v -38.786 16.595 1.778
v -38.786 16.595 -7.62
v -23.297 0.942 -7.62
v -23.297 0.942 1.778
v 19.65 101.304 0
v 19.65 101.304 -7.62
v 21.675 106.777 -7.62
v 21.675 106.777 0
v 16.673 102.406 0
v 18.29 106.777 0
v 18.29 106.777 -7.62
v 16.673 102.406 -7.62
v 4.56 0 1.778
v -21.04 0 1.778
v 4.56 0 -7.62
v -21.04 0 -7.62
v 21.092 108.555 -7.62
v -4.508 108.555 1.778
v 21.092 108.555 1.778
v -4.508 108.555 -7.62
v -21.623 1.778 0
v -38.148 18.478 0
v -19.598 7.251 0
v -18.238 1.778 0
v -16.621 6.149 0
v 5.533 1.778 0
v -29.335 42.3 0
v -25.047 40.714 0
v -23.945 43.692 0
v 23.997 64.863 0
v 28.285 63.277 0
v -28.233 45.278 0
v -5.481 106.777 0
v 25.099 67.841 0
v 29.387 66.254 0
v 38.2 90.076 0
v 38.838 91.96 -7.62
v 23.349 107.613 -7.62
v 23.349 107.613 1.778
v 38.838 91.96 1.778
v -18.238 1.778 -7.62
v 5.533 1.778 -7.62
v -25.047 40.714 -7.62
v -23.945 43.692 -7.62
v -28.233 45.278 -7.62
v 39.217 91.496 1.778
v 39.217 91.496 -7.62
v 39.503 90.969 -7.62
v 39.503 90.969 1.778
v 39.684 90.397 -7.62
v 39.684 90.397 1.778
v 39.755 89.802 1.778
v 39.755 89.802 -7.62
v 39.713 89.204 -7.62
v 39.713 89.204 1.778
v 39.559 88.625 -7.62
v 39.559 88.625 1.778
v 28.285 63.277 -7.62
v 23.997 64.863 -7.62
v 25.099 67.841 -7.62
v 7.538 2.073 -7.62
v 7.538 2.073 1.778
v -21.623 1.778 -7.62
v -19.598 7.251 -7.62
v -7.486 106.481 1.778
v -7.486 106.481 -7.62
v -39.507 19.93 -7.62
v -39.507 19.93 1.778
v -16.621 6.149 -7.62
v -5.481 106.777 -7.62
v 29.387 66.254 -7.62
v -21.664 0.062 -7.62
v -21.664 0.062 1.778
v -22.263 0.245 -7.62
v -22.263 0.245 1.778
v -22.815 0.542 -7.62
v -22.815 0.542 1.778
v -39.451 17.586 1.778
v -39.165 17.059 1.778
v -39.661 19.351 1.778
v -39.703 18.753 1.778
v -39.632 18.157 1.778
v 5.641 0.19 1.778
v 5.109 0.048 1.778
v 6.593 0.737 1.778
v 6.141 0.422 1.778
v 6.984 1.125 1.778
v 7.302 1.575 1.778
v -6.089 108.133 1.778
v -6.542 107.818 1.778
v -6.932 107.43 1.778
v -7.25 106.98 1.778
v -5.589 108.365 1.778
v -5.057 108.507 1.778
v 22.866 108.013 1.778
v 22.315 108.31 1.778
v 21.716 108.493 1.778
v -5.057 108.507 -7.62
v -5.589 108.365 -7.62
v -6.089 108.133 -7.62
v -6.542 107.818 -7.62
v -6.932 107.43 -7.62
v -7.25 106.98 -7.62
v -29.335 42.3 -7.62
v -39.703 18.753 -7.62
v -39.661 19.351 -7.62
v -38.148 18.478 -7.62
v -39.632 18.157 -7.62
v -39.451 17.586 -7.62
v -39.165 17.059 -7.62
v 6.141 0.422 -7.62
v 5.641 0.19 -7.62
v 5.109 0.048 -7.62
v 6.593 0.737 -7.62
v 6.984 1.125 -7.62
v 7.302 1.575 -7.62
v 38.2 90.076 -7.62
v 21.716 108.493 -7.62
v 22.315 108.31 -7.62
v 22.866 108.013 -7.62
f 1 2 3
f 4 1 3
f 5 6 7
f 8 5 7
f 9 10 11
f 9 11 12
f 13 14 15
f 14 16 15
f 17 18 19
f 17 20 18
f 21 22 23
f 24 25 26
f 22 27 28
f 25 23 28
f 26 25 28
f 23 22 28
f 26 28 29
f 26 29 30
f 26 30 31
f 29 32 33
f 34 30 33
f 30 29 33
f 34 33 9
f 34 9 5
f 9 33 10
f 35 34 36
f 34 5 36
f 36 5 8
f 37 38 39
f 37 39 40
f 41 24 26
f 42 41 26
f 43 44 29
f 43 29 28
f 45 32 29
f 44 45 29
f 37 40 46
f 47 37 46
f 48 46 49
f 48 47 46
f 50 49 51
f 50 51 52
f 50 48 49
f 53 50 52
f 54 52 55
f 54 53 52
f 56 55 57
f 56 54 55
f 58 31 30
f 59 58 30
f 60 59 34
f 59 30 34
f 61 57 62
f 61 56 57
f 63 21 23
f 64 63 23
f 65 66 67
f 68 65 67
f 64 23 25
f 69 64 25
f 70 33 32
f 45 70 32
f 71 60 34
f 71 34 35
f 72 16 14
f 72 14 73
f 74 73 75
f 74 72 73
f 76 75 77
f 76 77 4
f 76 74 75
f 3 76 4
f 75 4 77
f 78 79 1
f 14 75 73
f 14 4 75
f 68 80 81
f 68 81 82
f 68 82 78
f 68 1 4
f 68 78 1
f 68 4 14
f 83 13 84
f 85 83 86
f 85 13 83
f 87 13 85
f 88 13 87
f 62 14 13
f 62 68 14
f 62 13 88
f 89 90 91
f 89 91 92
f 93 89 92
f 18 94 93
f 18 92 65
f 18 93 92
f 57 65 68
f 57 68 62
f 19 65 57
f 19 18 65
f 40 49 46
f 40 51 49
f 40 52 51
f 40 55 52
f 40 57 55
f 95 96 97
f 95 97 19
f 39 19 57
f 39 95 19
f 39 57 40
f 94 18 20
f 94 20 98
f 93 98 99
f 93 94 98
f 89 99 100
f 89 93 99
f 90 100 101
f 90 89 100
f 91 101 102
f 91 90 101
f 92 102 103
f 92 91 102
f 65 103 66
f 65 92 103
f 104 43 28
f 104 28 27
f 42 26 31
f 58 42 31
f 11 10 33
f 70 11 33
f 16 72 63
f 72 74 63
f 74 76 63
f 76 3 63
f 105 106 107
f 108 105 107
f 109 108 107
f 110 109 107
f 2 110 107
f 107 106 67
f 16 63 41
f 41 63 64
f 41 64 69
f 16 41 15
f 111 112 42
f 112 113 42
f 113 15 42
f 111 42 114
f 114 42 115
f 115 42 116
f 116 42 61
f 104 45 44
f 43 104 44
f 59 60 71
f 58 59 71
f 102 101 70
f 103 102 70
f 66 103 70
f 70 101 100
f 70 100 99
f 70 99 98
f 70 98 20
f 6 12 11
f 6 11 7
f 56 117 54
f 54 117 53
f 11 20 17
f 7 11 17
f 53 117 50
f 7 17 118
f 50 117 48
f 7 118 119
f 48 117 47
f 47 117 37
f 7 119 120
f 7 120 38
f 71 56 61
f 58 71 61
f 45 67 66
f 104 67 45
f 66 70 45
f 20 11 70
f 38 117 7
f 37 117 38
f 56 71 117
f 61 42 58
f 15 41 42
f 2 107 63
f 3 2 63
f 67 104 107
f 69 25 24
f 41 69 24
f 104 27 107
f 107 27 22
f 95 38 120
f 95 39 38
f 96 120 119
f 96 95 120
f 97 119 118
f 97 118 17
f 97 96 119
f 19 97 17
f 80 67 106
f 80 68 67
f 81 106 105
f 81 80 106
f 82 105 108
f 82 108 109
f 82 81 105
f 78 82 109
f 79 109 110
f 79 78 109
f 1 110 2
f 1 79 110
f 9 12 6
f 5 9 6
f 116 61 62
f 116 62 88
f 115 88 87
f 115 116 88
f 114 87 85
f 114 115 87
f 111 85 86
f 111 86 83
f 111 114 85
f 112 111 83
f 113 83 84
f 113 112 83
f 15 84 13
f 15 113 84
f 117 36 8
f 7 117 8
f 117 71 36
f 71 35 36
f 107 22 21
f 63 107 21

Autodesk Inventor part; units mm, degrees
ref_plane "YZ Plane" through (0, 0, 0) normal (1, 0, 0) x (0, 1, 0)
ref_plane "XZ Plane" through (0, 0, 0) normal (0, 1, 0) x (-1, 0, 0)
ref_plane "XY Plane" through (0, 0, 0) normal (0, 0, 1) x (1, 0, 0)
sketch "TopProfile" plane through (0, 0, 0) normal (0, 0, 1) x (1, 0, 0)
  line L0 (22.417, 108.5547) -> (40.2604, 90.5219)
  line L1 (-6.7187, 108.5547) -> (22.417, 108.5547)
  line L2 (-6.7187, 108.5547) -> (-40.2084, 18.0328)
  line L3 (40.2604, 90.5219) -> (6.7706, 0)
  line L4 (-22.3651, 0) -> (6.7706, 0)
  line L5 (-40.2084, 18.0328) -> (-22.3651, 0)
  line L6 (-35.2804, 13.0524) -> (0.052, 108.5547) construction
  line L7 (0.052, 108.5547) -> (35.3323, 95.5023) construction
  line L8 (35.3323, 95.5023) -> (0, 0) construction
  line L9 (0, 0) -> (-35.2804, 13.0524) construction
  line L10 (-56.3022, 0) -> (56.3541, 0) construction
  line L11 (-38.1479, 18.4782) -> (-21.6231, 1.778)
  line L12 (-21.6231, 1.778) -> (5.5327, 1.778)
  line L13 (5.5327, 1.778) -> (38.1998, 90.0765)
  line L14 (38.1998, 90.0765) -> (21.6751, 106.7767)
  line L15 (21.6751, 106.7767) -> (-5.4807, 106.7767)
  line L16 (-5.4807, 106.7767) -> (-38.1479, 18.4782)
  line L17 (-29.3346, 42.3002) -> (-28.233, 45.278)
  line L18 (-28.233, 45.278) -> (-23.945, 43.6916)
  line L19 (-23.945, 43.6916) -> (-25.0467, 40.7138)
  line L20 (-25.0467, 40.7138) -> (-29.3346, 42.3002)
  line L21 (25.0986, 67.8409) -> (29.3866, 66.2545)
  line L22 (29.3866, 66.2545) -> (28.2849, 63.2768)
  line L23 (28.2849, 63.2768) -> (23.997, 64.8632)
  line L24 (23.997, 64.8632) -> (25.0986, 67.8409)
  line L25 (16.6726, 102.4057) -> (19.6504, 101.304)
  line L26 (19.6504, 101.304) -> (21.6751, 106.7767)
  line L27 (21.6751, 106.7767) -> (18.6973, 107.8784)
  line L28 (18.6973, 107.8784) -> (16.6726, 102.4057)
  line L29 (-19.5984, 7.2507) -> (-16.6207, 6.149)
  line L30 (-16.6207, 6.149) -> (-18.6454, 0.6763)
  line L31 (-18.6454, 0.6763) -> (-21.6231, 1.778)
  line L32 (-21.6231, 1.778) -> (-19.5984, 7.2507)
  point P0 (-18.2378, 1.778)
  point P1 (18.2897, 106.7767)
  dimension "d0" = 29.1357
  dimension "d2" = 69.697
  dimension "d3" = 25
  dimension "d4" = 25
  dimension "d5" = 101.8286
  dimension "d6" = 37.6174
  dimension "d7" = 25.3686
  dimension "d8" = 1.778
  dimension "d17" = 3.175
  dimension "d18" = 25.4
  dimension "d19" = 25.4
extrude "CapFeature" add sketch "TopProfile" along normal blind 1.778 contours L0 L3 L4 L5 L2 L1 | L16 L20 L19 L18 L15 L28 L25 L26 L14 L13 L21 L24 L23 L12 L30 L29 L32 L11 | L32 L29 L30 L12 | L12 L30 L31 | L16 L18 L19 L20 | L23 L24 L21 L13 | L28 L27 L15 | L15 L26 L25 L28
extrude "WallsFeature" add sketch "TopProfile" against normal blind 7.62 contours L0 L3 L4 L5 L2 L1 | L32 L29 L30 L12 | L12 L30 L31 | L16 L18 L19 L20 | L23 L24 L21 L13 | L28 L27 L15 | L15 L26 L25 L28
fillet "SideFilletsFeature" radius 3.175 6 edges at (-22.3651, 0, -2.921) (-40.2084, 18.0328, -2.921) (6.7706, 0, -2.921) (40.2604, 90.5219, -2.921) (22.417, 108.5547, -2.921) (-6.7187, 108.5547, -2.921)
equation "\"d19\" = d18"
properties part number "switchback-pickup-cover-8"
